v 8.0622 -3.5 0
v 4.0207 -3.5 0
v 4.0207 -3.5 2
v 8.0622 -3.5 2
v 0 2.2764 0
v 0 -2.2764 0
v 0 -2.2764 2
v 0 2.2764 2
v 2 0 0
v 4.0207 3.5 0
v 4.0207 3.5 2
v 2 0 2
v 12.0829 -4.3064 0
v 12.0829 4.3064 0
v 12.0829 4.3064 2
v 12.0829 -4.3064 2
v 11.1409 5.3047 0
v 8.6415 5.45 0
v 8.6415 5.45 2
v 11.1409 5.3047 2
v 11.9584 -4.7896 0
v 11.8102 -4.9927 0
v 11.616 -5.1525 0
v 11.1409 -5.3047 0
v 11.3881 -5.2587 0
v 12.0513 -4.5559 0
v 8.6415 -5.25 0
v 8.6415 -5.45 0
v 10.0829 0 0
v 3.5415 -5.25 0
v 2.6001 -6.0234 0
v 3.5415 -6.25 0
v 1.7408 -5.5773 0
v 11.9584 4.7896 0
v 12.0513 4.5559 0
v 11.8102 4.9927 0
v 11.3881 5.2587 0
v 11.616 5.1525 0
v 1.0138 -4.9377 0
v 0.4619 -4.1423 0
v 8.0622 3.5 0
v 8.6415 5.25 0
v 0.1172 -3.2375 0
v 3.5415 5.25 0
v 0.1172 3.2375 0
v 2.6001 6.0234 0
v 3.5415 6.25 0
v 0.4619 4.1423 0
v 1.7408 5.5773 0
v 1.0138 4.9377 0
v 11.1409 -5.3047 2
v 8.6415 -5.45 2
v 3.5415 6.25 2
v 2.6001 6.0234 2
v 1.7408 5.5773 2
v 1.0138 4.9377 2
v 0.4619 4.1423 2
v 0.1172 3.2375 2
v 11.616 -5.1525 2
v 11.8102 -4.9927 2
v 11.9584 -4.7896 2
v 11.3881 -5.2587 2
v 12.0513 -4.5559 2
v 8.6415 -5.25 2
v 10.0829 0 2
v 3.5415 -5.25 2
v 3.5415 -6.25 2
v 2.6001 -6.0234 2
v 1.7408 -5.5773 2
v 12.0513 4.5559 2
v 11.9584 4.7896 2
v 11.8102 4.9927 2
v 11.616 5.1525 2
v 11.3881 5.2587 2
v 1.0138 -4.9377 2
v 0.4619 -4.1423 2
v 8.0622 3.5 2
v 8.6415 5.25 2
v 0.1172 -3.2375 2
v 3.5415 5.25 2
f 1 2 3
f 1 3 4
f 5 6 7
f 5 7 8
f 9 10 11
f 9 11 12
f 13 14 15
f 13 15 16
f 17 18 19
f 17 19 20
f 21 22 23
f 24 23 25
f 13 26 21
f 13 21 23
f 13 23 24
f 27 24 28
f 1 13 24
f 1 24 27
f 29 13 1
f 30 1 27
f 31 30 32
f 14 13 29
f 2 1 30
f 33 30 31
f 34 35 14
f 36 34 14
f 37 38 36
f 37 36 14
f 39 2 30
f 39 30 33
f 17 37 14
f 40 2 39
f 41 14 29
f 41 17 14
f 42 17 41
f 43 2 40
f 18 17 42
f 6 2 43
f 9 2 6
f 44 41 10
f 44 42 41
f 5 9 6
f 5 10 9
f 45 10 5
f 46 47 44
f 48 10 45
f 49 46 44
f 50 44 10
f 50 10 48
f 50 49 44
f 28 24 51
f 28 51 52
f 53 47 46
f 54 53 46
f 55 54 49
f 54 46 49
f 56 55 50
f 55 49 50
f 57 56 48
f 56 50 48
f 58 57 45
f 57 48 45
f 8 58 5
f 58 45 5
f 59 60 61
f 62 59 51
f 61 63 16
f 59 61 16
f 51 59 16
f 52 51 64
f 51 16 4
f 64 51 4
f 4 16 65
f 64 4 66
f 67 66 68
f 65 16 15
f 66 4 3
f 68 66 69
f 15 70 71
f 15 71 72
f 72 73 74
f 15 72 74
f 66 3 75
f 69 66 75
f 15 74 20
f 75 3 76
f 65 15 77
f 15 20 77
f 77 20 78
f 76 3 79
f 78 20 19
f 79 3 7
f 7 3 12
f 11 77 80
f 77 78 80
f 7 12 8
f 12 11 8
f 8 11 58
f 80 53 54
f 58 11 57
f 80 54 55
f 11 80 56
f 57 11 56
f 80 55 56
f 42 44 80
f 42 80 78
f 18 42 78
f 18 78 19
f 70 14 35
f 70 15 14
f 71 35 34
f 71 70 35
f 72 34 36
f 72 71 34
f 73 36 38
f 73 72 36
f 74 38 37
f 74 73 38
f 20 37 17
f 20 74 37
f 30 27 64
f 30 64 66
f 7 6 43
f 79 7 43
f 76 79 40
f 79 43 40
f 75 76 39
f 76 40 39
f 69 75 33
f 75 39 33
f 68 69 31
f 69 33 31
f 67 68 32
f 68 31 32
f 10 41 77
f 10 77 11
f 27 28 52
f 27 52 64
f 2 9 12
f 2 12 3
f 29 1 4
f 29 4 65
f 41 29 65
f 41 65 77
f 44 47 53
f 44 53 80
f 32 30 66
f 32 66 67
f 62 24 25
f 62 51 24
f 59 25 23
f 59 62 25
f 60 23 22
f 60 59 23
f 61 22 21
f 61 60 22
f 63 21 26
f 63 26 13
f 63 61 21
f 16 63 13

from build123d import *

# Parameters (mm, degrees)
BOSS_EXTRU_1_DEPTH = 2
CONG_1_R           = 4
CONG_2_R           = 1


with BuildPart() as part:
    # Esquisse1 → Boss.-Extru.1 (new body)
    with BuildSketch(Plane.XY):
        Polygon((0, 6.25), (3.541451884, 6.25), (3.541451884, 5.25), (8.641451884, 5.25), (8.641451884, 5.45), (12.082903769, 5.25), (12.082903769, -5.25), (8.641451884, -5.45), (8.641451884, -5.25), (3.541451884, -5.25), (3.541451884, -6.25), (0, -6.25), align=None)
        Polygon((2, 0), (4.020725942, -3.5), (8.062177826, -3.5), (10.082903769, 0), (8.062177826, 3.5), (4.020725942, 3.5), align=None, mode=Mode.SUBTRACT)
    extrude(amount=BOSS_EXTRU_1_DEPTH)

    # Congé1
    # the kernel refuses this fillet: 4 mm, written as the material it takes off along each edge
    with BuildSketch(Plane(origin=(0, -6.25, -9.934074449), x_dir=(1, 0, 0), z_dir=(0, 0, 1))) as cong_1_piece_1:
        with BuildLine():
            CenterArc((4, 3.97362978), CONG_1_R, 180, 83.417310117)
            Line((0, 3.97362978), (-0.08, 3.97362978))
            Line((-0.08, 3.97362978), (-0.08, 0))
            Line((-0.08, 0), (0, -0.08))
            ThreePointArc((0, -0.08), (1.770725942, -0.08), (3.532280922, -0.079472596))
            Line((3.532280922, -0.079472596), (3.541451884, 0))
        make_face()
    extrude(amount=21.868148898, mode=Mode.SUBTRACT)
    with BuildSketch(Plane(origin=(0, 6.25, -9.934074449), x_dir=(1, 0, 0), z_dir=(0, 0, 1))) as cong_1_piece_2:
        with BuildLine():
            CenterArc((4, -3.97362978), CONG_1_R, 96.582689883, 83.417310117)
            Line((0, -3.97362978), (-0.08, -3.97362978))
            Line((-0.08, -3.97362978), (-0.08, 0))
            Line((-0.08, 0), (0, 0.08))
            ThreePointArc((0, 0.08), (1.770725942, 0.08), (3.532280922, 0.079472596))
            Line((3.532280922, 0.079472596), (3.541451884, 0))
        make_face()
    extrude(amount=21.868148898, mode=Mode.SUBTRACT)

    # Congé2
    cong_2_edges = [part.edges().sort_by_distance(p)[0] for p in [
        (12.082903769, 5.25, 1),
        (12.082903769, -5.25, 1),
    ]]
    fillet(cong_2_edges, radius=CONG_2_R)


solid = part.part
